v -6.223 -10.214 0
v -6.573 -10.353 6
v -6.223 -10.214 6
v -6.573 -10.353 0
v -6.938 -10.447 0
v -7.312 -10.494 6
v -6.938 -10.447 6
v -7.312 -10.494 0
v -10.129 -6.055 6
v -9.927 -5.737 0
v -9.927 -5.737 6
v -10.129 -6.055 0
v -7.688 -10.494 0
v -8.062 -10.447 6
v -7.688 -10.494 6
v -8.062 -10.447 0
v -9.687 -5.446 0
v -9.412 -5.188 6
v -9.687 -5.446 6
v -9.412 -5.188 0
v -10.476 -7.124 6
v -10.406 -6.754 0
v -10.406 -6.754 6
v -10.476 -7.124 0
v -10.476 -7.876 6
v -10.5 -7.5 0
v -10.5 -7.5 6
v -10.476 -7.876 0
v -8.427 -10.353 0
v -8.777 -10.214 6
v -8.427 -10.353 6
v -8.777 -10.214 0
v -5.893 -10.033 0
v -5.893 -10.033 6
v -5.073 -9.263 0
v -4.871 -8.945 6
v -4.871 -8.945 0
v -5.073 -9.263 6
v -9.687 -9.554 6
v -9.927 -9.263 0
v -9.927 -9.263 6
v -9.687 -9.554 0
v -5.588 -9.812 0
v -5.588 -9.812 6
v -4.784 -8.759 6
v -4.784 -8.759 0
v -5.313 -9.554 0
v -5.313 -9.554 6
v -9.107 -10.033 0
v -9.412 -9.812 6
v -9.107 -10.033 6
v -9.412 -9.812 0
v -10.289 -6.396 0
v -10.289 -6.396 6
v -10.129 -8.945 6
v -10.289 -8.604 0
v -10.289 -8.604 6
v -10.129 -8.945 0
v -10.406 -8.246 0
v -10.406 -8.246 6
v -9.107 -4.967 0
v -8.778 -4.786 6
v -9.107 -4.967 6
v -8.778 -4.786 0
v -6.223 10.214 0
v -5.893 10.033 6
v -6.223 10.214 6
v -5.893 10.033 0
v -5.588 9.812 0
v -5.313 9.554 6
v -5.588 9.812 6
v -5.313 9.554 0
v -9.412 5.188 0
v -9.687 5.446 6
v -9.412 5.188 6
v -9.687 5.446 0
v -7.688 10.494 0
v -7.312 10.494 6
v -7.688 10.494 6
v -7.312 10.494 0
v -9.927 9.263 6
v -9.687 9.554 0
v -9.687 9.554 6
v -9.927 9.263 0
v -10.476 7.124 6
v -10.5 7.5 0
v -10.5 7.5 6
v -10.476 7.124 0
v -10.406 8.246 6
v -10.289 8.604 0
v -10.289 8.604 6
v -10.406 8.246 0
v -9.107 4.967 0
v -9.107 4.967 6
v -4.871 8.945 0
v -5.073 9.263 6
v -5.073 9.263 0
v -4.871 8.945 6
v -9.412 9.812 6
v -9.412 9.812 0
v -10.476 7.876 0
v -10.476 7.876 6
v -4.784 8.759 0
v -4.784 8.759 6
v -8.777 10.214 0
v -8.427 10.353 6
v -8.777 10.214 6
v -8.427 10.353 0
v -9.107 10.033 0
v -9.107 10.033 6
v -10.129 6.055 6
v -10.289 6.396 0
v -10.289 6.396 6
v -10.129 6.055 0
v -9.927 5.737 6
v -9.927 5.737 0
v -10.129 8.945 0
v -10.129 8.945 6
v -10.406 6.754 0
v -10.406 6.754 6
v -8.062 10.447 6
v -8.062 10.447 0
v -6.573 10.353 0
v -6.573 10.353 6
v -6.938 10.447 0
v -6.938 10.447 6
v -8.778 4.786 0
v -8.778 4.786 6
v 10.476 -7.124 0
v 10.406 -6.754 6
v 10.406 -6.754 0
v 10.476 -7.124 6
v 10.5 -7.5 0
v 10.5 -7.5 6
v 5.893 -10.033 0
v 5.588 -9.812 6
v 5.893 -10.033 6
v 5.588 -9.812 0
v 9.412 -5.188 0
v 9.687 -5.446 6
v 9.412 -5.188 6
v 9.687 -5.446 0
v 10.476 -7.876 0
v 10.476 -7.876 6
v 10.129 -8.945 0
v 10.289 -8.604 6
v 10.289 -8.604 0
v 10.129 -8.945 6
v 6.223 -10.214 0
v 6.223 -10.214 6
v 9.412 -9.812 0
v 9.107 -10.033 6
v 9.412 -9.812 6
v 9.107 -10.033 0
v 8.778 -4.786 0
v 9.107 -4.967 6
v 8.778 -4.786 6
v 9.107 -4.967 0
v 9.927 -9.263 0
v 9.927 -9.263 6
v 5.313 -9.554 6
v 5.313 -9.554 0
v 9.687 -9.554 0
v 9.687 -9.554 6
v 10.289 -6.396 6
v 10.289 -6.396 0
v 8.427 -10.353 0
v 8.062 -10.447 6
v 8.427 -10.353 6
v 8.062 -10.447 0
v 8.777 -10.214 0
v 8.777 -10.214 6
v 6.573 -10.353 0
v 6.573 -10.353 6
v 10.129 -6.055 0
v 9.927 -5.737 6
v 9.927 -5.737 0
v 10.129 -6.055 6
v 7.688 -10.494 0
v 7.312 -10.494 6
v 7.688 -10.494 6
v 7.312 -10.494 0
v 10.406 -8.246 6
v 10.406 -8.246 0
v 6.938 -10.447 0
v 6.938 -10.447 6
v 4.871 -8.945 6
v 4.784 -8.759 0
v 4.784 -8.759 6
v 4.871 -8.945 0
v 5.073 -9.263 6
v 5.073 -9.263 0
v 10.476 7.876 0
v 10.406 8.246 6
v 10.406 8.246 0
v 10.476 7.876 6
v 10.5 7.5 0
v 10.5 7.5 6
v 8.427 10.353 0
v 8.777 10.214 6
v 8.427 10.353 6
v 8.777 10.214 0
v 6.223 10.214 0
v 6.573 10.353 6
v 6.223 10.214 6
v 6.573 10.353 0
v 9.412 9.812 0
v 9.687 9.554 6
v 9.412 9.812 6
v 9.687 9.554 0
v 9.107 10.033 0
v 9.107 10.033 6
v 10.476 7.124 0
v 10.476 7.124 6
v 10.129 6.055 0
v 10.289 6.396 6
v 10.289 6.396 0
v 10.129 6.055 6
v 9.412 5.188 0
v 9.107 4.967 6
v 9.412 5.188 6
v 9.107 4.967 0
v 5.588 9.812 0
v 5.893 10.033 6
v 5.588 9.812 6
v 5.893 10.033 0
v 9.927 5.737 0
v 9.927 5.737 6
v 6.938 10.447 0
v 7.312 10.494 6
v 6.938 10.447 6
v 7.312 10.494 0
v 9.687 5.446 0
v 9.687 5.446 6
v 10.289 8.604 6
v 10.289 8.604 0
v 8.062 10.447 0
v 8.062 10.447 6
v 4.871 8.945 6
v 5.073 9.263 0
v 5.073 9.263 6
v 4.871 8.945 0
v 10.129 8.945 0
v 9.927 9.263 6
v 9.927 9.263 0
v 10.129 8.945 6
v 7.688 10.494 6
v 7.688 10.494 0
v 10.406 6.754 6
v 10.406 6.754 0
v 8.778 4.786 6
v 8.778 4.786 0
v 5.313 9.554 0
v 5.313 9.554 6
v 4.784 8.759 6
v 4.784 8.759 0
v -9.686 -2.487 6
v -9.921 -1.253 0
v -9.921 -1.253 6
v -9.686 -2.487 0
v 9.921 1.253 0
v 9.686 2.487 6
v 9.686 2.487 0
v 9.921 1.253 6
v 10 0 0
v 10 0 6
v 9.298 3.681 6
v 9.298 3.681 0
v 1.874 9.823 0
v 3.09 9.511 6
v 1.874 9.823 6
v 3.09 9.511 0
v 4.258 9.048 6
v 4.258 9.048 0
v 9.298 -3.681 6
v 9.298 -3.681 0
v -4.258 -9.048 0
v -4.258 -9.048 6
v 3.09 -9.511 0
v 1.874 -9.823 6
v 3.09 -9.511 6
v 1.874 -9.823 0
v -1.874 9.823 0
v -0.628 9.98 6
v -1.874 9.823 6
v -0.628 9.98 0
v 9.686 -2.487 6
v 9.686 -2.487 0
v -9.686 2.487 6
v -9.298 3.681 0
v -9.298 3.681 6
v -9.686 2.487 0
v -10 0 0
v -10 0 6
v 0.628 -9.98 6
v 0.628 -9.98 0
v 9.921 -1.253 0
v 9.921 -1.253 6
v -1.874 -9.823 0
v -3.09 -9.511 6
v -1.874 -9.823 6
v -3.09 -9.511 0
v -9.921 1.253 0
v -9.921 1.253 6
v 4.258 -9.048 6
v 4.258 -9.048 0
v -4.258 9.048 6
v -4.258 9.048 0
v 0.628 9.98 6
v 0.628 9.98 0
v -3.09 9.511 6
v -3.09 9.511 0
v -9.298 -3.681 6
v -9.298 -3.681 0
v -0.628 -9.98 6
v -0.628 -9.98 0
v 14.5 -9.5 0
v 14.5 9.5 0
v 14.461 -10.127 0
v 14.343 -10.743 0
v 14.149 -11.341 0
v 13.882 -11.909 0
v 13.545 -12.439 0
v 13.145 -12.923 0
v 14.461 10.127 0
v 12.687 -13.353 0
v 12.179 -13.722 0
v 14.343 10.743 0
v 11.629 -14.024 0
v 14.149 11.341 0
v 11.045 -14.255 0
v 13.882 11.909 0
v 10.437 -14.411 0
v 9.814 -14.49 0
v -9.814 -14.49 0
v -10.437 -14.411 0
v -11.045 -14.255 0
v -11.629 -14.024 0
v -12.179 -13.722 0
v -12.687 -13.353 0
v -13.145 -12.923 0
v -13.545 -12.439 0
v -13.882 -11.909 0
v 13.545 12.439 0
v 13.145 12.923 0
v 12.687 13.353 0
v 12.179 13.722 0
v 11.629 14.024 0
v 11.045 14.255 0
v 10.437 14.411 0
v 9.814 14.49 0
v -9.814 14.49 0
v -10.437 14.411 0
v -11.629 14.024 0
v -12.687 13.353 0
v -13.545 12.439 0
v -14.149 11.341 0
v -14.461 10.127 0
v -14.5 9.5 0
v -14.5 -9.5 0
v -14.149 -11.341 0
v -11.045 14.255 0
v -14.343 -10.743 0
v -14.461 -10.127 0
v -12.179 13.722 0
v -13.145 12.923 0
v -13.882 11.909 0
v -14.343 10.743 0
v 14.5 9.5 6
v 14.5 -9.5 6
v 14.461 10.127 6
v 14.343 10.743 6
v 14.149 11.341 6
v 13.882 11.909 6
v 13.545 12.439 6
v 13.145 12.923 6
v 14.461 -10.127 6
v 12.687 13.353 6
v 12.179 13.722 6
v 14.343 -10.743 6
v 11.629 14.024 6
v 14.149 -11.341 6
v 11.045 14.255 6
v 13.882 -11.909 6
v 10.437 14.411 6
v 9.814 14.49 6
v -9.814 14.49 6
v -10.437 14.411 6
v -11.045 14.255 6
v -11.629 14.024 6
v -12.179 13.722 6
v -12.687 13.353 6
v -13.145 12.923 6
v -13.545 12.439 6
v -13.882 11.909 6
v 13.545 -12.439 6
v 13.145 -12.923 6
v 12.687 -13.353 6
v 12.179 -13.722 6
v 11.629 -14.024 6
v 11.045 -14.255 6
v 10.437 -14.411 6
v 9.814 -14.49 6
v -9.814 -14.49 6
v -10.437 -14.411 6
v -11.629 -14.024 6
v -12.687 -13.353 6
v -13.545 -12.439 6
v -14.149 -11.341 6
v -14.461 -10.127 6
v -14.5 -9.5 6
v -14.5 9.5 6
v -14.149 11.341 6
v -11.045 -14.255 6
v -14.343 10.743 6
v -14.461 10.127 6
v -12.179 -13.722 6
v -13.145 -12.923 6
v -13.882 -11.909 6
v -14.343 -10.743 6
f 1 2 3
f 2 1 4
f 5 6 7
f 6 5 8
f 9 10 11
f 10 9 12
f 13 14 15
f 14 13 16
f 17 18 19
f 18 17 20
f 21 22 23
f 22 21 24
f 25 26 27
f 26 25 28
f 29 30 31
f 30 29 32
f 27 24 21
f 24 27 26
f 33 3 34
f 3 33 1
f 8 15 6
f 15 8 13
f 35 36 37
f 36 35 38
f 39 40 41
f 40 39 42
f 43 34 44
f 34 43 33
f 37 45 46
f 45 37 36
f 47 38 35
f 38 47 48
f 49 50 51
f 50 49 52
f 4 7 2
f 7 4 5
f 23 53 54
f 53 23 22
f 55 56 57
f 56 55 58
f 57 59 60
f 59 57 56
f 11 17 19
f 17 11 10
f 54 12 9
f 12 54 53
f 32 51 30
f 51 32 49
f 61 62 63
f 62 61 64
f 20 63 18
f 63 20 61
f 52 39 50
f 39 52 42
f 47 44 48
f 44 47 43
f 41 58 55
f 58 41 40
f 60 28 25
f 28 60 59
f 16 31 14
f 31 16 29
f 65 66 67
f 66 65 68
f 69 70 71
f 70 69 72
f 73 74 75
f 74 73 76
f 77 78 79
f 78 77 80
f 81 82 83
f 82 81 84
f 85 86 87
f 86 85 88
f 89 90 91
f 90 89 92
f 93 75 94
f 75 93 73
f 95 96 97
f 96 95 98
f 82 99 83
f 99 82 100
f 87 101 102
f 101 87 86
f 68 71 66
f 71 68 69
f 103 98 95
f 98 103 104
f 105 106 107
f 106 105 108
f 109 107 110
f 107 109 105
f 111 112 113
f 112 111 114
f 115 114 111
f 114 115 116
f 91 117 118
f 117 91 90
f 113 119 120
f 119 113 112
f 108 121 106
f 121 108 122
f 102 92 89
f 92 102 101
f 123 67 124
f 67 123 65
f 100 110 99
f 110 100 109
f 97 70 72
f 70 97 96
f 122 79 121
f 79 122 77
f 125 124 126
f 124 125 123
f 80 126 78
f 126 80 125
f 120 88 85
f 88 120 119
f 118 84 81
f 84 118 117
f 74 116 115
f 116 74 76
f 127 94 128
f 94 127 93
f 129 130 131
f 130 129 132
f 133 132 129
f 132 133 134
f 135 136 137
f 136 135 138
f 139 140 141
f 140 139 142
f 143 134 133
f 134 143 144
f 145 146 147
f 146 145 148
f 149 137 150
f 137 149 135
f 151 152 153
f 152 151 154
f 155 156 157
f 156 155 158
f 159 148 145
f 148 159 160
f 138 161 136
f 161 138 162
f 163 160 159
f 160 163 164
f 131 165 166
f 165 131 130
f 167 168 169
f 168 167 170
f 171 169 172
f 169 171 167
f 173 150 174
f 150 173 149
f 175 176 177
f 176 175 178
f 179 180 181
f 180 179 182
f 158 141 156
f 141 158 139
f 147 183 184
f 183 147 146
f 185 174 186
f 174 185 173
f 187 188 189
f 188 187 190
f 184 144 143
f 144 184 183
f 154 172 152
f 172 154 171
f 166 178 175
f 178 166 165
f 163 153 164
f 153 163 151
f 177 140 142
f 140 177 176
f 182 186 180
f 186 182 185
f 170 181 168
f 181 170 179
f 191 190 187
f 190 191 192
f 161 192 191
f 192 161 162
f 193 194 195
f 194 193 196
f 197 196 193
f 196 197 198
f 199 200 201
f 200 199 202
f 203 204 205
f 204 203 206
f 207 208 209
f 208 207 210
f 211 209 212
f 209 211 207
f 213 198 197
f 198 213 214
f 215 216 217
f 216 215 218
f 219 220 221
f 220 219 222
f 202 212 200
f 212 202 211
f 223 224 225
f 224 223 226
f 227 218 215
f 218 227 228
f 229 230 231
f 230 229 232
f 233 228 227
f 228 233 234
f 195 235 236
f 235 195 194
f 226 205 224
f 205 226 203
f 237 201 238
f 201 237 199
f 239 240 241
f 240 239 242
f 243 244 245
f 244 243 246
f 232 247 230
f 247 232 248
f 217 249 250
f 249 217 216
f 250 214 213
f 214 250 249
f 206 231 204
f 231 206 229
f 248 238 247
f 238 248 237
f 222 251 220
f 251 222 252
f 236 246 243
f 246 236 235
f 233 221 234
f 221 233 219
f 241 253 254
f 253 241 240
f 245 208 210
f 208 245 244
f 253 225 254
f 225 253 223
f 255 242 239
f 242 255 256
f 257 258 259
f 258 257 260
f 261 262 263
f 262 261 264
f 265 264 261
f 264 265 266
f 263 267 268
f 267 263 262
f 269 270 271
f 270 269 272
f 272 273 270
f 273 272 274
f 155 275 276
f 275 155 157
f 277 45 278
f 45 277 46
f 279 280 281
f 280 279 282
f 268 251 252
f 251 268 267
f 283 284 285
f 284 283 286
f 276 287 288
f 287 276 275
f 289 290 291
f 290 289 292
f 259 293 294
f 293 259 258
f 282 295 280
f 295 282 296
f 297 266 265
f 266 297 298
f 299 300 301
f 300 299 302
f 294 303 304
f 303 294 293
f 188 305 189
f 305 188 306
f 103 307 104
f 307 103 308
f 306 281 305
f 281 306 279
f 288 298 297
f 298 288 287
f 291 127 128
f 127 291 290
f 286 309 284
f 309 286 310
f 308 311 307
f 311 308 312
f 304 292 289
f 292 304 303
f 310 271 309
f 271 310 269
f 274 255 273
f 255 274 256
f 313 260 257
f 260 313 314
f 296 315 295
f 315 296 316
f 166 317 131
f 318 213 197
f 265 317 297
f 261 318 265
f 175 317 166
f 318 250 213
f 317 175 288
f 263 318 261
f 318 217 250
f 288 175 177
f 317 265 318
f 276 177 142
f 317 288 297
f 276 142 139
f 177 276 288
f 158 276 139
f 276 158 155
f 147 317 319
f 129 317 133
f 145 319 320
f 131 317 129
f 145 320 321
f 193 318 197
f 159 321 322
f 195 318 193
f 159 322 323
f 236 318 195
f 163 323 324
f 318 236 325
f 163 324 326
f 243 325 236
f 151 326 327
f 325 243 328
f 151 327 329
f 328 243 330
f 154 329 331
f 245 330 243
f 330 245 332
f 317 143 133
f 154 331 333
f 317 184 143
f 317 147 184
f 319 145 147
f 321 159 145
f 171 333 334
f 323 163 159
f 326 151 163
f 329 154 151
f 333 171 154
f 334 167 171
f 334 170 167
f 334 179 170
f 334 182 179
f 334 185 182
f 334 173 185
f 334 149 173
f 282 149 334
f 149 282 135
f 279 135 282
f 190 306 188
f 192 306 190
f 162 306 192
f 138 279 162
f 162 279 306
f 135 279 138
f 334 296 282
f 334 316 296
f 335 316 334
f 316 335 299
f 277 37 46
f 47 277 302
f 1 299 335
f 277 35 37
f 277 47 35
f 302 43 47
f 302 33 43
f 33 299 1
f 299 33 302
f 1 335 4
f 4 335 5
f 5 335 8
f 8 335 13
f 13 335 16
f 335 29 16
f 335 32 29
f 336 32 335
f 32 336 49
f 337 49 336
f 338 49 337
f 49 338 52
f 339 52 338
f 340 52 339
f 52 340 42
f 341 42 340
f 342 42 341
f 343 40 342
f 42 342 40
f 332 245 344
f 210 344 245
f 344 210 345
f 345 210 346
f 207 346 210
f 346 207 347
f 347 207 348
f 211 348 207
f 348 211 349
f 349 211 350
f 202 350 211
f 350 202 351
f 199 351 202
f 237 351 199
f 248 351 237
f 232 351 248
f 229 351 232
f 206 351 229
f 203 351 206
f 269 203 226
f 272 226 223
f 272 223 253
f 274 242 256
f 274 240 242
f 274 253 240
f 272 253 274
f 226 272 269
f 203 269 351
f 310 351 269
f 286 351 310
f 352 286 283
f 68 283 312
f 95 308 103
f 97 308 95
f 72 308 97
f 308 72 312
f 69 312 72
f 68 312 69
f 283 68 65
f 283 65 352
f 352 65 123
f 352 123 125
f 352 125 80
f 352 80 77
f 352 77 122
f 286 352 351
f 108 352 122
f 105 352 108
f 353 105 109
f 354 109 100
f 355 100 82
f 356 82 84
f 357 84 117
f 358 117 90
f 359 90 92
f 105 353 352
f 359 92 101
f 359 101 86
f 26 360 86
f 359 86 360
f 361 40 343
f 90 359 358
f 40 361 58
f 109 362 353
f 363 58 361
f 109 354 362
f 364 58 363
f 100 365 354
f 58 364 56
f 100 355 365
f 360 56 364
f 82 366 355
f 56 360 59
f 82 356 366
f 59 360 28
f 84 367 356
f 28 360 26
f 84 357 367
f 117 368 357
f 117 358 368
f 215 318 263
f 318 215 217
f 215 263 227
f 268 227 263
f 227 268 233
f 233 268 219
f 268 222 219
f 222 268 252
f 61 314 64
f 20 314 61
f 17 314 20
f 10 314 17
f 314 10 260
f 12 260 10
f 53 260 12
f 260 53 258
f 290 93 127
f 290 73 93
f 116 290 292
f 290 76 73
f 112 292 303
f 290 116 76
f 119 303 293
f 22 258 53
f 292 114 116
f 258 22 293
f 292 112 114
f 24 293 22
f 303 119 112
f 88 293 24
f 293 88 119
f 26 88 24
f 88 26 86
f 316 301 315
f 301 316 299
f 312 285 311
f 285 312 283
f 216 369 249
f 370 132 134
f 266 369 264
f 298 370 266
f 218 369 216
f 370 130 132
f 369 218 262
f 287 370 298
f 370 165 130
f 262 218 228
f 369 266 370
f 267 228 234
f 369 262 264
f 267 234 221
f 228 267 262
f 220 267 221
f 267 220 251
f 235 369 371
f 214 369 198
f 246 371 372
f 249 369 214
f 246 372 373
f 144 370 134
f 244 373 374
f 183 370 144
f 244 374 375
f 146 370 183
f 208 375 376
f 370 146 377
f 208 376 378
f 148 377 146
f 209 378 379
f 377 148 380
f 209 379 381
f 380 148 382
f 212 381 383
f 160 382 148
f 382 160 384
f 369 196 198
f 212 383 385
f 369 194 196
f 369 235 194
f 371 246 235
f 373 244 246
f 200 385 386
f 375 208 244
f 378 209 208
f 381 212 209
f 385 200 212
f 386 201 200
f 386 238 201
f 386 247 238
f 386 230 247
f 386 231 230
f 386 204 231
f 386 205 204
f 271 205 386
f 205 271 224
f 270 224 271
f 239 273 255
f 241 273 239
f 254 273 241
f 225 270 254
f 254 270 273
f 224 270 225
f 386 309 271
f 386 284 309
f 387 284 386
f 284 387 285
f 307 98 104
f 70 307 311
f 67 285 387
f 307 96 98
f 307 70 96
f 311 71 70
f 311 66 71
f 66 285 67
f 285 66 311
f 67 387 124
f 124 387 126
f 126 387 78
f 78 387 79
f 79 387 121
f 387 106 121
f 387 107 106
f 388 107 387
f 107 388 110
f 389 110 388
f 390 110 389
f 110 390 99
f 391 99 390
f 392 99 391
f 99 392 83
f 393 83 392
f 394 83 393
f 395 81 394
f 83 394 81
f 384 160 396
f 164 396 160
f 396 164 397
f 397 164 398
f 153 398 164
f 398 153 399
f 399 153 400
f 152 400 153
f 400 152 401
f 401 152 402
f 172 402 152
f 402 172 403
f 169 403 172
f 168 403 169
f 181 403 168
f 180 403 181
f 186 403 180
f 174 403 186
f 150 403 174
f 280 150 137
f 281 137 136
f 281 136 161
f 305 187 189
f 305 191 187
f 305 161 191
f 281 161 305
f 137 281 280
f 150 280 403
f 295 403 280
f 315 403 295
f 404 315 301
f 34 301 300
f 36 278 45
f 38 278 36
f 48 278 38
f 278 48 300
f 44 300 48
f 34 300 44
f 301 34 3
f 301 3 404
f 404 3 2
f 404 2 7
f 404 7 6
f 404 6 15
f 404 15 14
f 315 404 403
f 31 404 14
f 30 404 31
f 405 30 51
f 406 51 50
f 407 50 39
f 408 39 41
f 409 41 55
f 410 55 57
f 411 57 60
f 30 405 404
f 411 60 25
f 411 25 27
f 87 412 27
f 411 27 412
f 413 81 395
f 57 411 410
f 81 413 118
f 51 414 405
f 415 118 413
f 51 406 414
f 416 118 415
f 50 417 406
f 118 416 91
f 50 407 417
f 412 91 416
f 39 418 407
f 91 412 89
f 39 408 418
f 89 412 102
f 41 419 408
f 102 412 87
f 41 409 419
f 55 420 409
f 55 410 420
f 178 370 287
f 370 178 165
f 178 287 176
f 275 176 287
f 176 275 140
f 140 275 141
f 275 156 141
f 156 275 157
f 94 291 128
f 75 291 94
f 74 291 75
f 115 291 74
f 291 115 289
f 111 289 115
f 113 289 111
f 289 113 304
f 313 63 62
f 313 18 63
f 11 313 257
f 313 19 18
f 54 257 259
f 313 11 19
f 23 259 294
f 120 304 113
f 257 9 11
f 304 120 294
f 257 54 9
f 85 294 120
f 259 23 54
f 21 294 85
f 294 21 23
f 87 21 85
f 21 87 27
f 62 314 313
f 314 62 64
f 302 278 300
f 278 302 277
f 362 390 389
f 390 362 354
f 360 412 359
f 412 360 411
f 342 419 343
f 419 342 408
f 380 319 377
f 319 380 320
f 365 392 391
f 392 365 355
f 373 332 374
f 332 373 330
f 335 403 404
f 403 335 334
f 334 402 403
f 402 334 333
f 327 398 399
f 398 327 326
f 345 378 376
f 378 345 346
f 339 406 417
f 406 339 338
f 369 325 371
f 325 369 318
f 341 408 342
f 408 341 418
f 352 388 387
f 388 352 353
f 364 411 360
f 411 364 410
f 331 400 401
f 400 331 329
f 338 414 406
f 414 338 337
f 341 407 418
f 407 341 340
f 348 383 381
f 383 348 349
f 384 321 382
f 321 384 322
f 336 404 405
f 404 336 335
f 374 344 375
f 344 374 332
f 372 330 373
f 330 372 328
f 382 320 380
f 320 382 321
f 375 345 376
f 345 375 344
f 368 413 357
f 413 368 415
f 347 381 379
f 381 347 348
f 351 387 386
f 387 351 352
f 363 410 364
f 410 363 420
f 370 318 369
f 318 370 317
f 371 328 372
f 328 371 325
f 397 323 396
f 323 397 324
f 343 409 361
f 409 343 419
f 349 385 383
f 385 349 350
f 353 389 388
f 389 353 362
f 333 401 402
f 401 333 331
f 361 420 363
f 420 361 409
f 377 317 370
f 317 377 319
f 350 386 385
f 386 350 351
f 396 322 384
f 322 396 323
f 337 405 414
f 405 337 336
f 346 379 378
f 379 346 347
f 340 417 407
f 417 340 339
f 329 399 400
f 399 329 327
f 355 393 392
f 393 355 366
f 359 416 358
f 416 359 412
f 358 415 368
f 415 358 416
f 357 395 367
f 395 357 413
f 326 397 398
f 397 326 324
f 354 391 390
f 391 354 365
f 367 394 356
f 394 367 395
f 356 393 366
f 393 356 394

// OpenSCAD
$fn = 50;


difference() {
	union() {
		hull() {
			translate(v = [-9.5000000000, 9.5000000000, 0]) {
				cylinder(h = 6, r = 5);
			}
			translate(v = [9.5000000000, 9.5000000000, 0]) {
				cylinder(h = 6, r = 5);
			}
			translate(v = [-9.5000000000, -9.5000000000, 0]) {
				cylinder(h = 6, r = 5);
			}
			translate(v = [9.5000000000, -9.5000000000, 0]) {
				cylinder(h = 6, r = 5);
			}
		}
	}
	union() {
		#translate(v = [-7.5000000000, -7.5000000000, -100.0000000000]) {
			cylinder(h = 200, r = 3.0000000000);
		}
		#translate(v = [-7.5000000000, 7.5000000000, -100.0000000000]) {
			cylinder(h = 200, r = 3.0000000000);
		}
		#translate(v = [7.5000000000, -7.5000000000, -100.0000000000]) {
			cylinder(h = 200, r = 3.0000000000);
		}
		#translate(v = [7.5000000000, 7.5000000000, -100.0000000000]) {
			cylinder(h = 200, r = 3.0000000000);
		}
		#cylinder(h = 6, r = 10.0000000000);
	}
}
